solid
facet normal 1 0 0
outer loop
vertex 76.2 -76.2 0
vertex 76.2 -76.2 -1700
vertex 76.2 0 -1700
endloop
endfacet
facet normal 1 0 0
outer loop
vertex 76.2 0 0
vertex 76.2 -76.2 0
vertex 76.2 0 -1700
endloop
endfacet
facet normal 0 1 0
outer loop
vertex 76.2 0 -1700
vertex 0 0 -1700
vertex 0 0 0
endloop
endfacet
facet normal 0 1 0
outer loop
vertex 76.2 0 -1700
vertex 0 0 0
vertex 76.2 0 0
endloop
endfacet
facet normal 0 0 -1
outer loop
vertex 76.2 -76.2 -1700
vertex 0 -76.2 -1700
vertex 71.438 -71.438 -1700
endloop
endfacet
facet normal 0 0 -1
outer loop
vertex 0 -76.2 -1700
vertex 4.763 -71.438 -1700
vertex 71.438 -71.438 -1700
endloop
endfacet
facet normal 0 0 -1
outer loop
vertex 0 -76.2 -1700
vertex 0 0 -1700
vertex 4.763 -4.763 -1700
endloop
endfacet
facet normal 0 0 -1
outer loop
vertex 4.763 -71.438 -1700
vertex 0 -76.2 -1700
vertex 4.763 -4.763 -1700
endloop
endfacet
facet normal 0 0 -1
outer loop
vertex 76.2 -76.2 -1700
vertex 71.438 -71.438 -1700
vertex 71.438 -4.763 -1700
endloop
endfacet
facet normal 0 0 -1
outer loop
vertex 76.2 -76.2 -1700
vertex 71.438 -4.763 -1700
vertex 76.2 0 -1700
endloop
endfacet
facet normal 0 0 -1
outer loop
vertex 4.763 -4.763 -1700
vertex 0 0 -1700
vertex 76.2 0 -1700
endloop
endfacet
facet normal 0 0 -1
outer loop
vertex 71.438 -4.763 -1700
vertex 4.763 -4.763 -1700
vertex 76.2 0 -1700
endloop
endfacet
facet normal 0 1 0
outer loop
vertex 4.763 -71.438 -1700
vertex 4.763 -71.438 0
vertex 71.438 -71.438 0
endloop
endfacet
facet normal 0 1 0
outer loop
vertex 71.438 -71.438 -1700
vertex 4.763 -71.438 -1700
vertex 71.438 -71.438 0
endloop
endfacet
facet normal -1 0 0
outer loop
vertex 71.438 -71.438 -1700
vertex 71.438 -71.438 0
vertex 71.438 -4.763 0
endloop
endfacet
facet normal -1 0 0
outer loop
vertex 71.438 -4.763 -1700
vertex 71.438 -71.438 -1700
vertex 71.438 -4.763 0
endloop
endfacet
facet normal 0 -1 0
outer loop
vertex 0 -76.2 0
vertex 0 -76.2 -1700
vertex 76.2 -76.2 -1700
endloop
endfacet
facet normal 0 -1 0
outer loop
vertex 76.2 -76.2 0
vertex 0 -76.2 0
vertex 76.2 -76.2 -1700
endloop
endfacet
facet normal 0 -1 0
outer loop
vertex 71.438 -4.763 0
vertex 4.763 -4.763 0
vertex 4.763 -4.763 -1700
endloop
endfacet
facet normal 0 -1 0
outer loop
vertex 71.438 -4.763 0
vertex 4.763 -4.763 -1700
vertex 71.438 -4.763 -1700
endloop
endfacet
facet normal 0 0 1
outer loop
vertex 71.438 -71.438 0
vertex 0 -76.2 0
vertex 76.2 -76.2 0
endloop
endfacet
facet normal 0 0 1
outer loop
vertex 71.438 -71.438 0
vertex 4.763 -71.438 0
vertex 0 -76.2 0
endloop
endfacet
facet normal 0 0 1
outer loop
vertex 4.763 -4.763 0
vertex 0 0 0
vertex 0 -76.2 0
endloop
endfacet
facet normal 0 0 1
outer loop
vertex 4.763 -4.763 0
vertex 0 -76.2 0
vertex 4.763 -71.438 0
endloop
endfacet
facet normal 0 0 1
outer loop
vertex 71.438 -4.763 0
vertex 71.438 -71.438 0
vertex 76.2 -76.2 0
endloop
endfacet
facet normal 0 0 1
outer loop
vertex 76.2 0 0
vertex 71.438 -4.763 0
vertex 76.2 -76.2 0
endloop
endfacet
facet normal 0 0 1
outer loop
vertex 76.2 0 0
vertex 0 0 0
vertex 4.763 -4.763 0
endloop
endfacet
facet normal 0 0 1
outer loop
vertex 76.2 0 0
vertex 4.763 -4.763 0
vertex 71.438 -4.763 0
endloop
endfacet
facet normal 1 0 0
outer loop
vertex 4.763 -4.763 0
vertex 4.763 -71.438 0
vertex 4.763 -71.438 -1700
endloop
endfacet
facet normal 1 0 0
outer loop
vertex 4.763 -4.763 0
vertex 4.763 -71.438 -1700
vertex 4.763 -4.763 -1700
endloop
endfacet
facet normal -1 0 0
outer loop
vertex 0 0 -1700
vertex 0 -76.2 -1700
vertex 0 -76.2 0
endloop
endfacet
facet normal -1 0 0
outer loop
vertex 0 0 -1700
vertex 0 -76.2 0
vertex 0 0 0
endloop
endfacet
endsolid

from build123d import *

# Parameters (mm, degrees)
CROQUIS2_W              = 76.2
CROQUIS2_H              = 76.2
CROQUIS2_W_2            = 66.675
CROQUIS2_H_2            = 66.675
SALIENTE_EXTRUIR1_DEPTH = 1700


with BuildPart() as part:
    # Croquis2 → Saliente-Extruir1 (new body)
    with BuildSketch(Plane.XY):
        with Locations((38.1, -38.1)):
            Rectangle(CROQUIS2_W, CROQUIS2_H)
        with Locations((38.1, -38.1)):
            Rectangle(CROQUIS2_W_2, CROQUIS2_H_2, mode=Mode.SUBTRACT)
    extrude(amount=-SALIENTE_EXTRUIR1_DEPTH)


solid = part.part
